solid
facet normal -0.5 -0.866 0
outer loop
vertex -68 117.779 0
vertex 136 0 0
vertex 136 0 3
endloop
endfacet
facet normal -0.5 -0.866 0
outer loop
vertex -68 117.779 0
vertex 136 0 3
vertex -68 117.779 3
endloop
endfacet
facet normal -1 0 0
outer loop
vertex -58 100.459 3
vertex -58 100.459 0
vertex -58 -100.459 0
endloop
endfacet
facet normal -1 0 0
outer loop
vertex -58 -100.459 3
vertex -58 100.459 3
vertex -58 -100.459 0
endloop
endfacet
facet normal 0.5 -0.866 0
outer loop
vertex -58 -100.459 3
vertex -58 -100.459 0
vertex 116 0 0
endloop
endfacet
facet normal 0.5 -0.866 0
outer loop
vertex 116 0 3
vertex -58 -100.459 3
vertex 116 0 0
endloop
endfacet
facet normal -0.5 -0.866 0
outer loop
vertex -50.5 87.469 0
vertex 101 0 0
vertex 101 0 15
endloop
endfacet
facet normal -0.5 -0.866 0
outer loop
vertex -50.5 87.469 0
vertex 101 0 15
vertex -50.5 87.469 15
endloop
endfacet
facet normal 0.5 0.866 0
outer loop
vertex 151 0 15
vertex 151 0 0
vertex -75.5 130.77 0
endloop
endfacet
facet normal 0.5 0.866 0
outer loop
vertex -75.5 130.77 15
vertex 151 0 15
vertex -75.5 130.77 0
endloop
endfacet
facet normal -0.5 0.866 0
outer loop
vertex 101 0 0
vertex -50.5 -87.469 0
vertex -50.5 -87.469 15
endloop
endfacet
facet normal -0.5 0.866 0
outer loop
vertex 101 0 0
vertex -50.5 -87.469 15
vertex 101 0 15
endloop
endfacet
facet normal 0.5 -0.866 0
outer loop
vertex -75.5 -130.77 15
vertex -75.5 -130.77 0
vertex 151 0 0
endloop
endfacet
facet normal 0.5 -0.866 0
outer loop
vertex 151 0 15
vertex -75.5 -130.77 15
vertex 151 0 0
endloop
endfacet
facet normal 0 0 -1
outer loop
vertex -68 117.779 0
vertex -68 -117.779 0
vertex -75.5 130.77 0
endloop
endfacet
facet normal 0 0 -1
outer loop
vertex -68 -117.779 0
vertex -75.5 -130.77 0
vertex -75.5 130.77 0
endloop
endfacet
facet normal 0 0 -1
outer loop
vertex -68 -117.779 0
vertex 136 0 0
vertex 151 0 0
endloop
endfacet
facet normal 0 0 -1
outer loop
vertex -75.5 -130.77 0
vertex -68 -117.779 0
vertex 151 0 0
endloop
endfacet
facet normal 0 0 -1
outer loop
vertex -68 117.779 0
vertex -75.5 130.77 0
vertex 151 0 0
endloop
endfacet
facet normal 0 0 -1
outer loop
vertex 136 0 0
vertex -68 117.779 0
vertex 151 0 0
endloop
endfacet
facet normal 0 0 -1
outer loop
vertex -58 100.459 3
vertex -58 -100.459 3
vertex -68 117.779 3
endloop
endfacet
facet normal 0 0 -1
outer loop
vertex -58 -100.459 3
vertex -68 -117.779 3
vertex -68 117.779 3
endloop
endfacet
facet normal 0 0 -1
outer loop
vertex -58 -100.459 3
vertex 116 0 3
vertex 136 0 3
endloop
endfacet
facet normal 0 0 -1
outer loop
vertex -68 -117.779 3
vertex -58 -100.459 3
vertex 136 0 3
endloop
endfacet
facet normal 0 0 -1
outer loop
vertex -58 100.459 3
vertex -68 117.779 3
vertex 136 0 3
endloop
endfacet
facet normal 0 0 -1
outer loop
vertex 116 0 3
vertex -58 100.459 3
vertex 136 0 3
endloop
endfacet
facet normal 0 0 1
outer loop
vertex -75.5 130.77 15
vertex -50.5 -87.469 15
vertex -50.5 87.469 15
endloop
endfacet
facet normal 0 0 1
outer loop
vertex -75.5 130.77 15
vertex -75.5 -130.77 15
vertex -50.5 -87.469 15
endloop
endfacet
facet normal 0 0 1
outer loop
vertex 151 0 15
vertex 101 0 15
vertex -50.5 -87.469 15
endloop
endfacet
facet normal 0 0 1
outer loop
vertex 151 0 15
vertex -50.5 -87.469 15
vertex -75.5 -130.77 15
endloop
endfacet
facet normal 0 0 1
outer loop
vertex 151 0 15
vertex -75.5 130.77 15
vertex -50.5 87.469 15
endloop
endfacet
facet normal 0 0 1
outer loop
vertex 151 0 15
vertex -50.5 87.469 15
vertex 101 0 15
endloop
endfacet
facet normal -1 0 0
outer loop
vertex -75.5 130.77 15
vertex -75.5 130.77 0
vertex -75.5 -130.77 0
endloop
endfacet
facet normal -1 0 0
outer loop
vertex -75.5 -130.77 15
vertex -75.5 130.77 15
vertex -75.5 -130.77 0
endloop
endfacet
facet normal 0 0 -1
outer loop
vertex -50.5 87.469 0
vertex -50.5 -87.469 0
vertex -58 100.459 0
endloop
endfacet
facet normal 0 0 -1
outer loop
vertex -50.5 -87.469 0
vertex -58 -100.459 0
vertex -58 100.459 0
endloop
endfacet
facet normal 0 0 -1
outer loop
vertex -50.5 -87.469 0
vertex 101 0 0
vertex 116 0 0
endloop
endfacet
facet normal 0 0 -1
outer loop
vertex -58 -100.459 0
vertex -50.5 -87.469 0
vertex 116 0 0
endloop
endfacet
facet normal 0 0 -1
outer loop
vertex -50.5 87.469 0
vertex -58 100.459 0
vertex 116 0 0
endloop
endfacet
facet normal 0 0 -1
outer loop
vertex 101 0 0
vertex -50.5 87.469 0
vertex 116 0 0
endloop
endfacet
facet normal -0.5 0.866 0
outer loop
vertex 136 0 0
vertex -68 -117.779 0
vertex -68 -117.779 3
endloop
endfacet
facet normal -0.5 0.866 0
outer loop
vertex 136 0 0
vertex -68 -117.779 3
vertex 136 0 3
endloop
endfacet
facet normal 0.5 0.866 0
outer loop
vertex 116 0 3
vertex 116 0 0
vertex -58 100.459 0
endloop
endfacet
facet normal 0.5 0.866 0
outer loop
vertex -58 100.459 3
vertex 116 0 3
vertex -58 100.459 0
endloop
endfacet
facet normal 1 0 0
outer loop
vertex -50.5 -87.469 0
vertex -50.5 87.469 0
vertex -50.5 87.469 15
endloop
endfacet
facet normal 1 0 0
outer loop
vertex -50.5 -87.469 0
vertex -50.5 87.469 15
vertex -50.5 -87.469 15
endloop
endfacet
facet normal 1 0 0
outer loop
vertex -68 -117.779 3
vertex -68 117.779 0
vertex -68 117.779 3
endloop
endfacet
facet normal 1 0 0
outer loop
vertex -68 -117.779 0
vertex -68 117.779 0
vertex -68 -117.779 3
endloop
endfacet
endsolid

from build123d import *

# Parameters (mm, degrees)
PRISM003_DEPTH = 15
PRISM001_DEPTH = 3
PRISM_DEPTH    = 3
PRISM002_DEPTH = 15


with BuildPart() as prism003:
    # Prism003 → Prism003 (new body)
    with BuildSketch(Plane.XY):
        Polygon((101, 0), (-50.5, 87.468566), (-50.5, -87.468566), align=None)
    extrude(amount=PRISM003_DEPTH)


with BuildPart() as prism001:
    # Prism001 → Prism001 (new body)
    with BuildSketch(Plane.XY):
        Polygon((116, 0), (-58, 100.458947), (-58, -100.458947), align=None)
    extrude(amount=PRISM001_DEPTH)


with BuildPart() as cut:
    # Prism → Prism (new body)
    with BuildSketch(Plane.XY):
        Polygon((136, 0), (-68, 117.779455), (-68, -117.779455), align=None)
    extrude(amount=PRISM_DEPTH)

    # Cut: cut Prism001
    add(prism001.part, mode=Mode.SUBTRACT)


with BuildPart() as cut002:
    # Prism002 → Prism002 (new body)
    with BuildSketch(Plane.XY):
        Polygon((151, 0), (-75.5, 130.769836), (-75.5, -130.769836), align=None)
    extrude(amount=PRISM002_DEPTH)

    # Cut001: cut Cut
    add(cut.part, mode=Mode.SUBTRACT)

    # Cut002: cut Prism003
    add(prism003.part, mode=Mode.SUBTRACT)


solid = cut002.part
